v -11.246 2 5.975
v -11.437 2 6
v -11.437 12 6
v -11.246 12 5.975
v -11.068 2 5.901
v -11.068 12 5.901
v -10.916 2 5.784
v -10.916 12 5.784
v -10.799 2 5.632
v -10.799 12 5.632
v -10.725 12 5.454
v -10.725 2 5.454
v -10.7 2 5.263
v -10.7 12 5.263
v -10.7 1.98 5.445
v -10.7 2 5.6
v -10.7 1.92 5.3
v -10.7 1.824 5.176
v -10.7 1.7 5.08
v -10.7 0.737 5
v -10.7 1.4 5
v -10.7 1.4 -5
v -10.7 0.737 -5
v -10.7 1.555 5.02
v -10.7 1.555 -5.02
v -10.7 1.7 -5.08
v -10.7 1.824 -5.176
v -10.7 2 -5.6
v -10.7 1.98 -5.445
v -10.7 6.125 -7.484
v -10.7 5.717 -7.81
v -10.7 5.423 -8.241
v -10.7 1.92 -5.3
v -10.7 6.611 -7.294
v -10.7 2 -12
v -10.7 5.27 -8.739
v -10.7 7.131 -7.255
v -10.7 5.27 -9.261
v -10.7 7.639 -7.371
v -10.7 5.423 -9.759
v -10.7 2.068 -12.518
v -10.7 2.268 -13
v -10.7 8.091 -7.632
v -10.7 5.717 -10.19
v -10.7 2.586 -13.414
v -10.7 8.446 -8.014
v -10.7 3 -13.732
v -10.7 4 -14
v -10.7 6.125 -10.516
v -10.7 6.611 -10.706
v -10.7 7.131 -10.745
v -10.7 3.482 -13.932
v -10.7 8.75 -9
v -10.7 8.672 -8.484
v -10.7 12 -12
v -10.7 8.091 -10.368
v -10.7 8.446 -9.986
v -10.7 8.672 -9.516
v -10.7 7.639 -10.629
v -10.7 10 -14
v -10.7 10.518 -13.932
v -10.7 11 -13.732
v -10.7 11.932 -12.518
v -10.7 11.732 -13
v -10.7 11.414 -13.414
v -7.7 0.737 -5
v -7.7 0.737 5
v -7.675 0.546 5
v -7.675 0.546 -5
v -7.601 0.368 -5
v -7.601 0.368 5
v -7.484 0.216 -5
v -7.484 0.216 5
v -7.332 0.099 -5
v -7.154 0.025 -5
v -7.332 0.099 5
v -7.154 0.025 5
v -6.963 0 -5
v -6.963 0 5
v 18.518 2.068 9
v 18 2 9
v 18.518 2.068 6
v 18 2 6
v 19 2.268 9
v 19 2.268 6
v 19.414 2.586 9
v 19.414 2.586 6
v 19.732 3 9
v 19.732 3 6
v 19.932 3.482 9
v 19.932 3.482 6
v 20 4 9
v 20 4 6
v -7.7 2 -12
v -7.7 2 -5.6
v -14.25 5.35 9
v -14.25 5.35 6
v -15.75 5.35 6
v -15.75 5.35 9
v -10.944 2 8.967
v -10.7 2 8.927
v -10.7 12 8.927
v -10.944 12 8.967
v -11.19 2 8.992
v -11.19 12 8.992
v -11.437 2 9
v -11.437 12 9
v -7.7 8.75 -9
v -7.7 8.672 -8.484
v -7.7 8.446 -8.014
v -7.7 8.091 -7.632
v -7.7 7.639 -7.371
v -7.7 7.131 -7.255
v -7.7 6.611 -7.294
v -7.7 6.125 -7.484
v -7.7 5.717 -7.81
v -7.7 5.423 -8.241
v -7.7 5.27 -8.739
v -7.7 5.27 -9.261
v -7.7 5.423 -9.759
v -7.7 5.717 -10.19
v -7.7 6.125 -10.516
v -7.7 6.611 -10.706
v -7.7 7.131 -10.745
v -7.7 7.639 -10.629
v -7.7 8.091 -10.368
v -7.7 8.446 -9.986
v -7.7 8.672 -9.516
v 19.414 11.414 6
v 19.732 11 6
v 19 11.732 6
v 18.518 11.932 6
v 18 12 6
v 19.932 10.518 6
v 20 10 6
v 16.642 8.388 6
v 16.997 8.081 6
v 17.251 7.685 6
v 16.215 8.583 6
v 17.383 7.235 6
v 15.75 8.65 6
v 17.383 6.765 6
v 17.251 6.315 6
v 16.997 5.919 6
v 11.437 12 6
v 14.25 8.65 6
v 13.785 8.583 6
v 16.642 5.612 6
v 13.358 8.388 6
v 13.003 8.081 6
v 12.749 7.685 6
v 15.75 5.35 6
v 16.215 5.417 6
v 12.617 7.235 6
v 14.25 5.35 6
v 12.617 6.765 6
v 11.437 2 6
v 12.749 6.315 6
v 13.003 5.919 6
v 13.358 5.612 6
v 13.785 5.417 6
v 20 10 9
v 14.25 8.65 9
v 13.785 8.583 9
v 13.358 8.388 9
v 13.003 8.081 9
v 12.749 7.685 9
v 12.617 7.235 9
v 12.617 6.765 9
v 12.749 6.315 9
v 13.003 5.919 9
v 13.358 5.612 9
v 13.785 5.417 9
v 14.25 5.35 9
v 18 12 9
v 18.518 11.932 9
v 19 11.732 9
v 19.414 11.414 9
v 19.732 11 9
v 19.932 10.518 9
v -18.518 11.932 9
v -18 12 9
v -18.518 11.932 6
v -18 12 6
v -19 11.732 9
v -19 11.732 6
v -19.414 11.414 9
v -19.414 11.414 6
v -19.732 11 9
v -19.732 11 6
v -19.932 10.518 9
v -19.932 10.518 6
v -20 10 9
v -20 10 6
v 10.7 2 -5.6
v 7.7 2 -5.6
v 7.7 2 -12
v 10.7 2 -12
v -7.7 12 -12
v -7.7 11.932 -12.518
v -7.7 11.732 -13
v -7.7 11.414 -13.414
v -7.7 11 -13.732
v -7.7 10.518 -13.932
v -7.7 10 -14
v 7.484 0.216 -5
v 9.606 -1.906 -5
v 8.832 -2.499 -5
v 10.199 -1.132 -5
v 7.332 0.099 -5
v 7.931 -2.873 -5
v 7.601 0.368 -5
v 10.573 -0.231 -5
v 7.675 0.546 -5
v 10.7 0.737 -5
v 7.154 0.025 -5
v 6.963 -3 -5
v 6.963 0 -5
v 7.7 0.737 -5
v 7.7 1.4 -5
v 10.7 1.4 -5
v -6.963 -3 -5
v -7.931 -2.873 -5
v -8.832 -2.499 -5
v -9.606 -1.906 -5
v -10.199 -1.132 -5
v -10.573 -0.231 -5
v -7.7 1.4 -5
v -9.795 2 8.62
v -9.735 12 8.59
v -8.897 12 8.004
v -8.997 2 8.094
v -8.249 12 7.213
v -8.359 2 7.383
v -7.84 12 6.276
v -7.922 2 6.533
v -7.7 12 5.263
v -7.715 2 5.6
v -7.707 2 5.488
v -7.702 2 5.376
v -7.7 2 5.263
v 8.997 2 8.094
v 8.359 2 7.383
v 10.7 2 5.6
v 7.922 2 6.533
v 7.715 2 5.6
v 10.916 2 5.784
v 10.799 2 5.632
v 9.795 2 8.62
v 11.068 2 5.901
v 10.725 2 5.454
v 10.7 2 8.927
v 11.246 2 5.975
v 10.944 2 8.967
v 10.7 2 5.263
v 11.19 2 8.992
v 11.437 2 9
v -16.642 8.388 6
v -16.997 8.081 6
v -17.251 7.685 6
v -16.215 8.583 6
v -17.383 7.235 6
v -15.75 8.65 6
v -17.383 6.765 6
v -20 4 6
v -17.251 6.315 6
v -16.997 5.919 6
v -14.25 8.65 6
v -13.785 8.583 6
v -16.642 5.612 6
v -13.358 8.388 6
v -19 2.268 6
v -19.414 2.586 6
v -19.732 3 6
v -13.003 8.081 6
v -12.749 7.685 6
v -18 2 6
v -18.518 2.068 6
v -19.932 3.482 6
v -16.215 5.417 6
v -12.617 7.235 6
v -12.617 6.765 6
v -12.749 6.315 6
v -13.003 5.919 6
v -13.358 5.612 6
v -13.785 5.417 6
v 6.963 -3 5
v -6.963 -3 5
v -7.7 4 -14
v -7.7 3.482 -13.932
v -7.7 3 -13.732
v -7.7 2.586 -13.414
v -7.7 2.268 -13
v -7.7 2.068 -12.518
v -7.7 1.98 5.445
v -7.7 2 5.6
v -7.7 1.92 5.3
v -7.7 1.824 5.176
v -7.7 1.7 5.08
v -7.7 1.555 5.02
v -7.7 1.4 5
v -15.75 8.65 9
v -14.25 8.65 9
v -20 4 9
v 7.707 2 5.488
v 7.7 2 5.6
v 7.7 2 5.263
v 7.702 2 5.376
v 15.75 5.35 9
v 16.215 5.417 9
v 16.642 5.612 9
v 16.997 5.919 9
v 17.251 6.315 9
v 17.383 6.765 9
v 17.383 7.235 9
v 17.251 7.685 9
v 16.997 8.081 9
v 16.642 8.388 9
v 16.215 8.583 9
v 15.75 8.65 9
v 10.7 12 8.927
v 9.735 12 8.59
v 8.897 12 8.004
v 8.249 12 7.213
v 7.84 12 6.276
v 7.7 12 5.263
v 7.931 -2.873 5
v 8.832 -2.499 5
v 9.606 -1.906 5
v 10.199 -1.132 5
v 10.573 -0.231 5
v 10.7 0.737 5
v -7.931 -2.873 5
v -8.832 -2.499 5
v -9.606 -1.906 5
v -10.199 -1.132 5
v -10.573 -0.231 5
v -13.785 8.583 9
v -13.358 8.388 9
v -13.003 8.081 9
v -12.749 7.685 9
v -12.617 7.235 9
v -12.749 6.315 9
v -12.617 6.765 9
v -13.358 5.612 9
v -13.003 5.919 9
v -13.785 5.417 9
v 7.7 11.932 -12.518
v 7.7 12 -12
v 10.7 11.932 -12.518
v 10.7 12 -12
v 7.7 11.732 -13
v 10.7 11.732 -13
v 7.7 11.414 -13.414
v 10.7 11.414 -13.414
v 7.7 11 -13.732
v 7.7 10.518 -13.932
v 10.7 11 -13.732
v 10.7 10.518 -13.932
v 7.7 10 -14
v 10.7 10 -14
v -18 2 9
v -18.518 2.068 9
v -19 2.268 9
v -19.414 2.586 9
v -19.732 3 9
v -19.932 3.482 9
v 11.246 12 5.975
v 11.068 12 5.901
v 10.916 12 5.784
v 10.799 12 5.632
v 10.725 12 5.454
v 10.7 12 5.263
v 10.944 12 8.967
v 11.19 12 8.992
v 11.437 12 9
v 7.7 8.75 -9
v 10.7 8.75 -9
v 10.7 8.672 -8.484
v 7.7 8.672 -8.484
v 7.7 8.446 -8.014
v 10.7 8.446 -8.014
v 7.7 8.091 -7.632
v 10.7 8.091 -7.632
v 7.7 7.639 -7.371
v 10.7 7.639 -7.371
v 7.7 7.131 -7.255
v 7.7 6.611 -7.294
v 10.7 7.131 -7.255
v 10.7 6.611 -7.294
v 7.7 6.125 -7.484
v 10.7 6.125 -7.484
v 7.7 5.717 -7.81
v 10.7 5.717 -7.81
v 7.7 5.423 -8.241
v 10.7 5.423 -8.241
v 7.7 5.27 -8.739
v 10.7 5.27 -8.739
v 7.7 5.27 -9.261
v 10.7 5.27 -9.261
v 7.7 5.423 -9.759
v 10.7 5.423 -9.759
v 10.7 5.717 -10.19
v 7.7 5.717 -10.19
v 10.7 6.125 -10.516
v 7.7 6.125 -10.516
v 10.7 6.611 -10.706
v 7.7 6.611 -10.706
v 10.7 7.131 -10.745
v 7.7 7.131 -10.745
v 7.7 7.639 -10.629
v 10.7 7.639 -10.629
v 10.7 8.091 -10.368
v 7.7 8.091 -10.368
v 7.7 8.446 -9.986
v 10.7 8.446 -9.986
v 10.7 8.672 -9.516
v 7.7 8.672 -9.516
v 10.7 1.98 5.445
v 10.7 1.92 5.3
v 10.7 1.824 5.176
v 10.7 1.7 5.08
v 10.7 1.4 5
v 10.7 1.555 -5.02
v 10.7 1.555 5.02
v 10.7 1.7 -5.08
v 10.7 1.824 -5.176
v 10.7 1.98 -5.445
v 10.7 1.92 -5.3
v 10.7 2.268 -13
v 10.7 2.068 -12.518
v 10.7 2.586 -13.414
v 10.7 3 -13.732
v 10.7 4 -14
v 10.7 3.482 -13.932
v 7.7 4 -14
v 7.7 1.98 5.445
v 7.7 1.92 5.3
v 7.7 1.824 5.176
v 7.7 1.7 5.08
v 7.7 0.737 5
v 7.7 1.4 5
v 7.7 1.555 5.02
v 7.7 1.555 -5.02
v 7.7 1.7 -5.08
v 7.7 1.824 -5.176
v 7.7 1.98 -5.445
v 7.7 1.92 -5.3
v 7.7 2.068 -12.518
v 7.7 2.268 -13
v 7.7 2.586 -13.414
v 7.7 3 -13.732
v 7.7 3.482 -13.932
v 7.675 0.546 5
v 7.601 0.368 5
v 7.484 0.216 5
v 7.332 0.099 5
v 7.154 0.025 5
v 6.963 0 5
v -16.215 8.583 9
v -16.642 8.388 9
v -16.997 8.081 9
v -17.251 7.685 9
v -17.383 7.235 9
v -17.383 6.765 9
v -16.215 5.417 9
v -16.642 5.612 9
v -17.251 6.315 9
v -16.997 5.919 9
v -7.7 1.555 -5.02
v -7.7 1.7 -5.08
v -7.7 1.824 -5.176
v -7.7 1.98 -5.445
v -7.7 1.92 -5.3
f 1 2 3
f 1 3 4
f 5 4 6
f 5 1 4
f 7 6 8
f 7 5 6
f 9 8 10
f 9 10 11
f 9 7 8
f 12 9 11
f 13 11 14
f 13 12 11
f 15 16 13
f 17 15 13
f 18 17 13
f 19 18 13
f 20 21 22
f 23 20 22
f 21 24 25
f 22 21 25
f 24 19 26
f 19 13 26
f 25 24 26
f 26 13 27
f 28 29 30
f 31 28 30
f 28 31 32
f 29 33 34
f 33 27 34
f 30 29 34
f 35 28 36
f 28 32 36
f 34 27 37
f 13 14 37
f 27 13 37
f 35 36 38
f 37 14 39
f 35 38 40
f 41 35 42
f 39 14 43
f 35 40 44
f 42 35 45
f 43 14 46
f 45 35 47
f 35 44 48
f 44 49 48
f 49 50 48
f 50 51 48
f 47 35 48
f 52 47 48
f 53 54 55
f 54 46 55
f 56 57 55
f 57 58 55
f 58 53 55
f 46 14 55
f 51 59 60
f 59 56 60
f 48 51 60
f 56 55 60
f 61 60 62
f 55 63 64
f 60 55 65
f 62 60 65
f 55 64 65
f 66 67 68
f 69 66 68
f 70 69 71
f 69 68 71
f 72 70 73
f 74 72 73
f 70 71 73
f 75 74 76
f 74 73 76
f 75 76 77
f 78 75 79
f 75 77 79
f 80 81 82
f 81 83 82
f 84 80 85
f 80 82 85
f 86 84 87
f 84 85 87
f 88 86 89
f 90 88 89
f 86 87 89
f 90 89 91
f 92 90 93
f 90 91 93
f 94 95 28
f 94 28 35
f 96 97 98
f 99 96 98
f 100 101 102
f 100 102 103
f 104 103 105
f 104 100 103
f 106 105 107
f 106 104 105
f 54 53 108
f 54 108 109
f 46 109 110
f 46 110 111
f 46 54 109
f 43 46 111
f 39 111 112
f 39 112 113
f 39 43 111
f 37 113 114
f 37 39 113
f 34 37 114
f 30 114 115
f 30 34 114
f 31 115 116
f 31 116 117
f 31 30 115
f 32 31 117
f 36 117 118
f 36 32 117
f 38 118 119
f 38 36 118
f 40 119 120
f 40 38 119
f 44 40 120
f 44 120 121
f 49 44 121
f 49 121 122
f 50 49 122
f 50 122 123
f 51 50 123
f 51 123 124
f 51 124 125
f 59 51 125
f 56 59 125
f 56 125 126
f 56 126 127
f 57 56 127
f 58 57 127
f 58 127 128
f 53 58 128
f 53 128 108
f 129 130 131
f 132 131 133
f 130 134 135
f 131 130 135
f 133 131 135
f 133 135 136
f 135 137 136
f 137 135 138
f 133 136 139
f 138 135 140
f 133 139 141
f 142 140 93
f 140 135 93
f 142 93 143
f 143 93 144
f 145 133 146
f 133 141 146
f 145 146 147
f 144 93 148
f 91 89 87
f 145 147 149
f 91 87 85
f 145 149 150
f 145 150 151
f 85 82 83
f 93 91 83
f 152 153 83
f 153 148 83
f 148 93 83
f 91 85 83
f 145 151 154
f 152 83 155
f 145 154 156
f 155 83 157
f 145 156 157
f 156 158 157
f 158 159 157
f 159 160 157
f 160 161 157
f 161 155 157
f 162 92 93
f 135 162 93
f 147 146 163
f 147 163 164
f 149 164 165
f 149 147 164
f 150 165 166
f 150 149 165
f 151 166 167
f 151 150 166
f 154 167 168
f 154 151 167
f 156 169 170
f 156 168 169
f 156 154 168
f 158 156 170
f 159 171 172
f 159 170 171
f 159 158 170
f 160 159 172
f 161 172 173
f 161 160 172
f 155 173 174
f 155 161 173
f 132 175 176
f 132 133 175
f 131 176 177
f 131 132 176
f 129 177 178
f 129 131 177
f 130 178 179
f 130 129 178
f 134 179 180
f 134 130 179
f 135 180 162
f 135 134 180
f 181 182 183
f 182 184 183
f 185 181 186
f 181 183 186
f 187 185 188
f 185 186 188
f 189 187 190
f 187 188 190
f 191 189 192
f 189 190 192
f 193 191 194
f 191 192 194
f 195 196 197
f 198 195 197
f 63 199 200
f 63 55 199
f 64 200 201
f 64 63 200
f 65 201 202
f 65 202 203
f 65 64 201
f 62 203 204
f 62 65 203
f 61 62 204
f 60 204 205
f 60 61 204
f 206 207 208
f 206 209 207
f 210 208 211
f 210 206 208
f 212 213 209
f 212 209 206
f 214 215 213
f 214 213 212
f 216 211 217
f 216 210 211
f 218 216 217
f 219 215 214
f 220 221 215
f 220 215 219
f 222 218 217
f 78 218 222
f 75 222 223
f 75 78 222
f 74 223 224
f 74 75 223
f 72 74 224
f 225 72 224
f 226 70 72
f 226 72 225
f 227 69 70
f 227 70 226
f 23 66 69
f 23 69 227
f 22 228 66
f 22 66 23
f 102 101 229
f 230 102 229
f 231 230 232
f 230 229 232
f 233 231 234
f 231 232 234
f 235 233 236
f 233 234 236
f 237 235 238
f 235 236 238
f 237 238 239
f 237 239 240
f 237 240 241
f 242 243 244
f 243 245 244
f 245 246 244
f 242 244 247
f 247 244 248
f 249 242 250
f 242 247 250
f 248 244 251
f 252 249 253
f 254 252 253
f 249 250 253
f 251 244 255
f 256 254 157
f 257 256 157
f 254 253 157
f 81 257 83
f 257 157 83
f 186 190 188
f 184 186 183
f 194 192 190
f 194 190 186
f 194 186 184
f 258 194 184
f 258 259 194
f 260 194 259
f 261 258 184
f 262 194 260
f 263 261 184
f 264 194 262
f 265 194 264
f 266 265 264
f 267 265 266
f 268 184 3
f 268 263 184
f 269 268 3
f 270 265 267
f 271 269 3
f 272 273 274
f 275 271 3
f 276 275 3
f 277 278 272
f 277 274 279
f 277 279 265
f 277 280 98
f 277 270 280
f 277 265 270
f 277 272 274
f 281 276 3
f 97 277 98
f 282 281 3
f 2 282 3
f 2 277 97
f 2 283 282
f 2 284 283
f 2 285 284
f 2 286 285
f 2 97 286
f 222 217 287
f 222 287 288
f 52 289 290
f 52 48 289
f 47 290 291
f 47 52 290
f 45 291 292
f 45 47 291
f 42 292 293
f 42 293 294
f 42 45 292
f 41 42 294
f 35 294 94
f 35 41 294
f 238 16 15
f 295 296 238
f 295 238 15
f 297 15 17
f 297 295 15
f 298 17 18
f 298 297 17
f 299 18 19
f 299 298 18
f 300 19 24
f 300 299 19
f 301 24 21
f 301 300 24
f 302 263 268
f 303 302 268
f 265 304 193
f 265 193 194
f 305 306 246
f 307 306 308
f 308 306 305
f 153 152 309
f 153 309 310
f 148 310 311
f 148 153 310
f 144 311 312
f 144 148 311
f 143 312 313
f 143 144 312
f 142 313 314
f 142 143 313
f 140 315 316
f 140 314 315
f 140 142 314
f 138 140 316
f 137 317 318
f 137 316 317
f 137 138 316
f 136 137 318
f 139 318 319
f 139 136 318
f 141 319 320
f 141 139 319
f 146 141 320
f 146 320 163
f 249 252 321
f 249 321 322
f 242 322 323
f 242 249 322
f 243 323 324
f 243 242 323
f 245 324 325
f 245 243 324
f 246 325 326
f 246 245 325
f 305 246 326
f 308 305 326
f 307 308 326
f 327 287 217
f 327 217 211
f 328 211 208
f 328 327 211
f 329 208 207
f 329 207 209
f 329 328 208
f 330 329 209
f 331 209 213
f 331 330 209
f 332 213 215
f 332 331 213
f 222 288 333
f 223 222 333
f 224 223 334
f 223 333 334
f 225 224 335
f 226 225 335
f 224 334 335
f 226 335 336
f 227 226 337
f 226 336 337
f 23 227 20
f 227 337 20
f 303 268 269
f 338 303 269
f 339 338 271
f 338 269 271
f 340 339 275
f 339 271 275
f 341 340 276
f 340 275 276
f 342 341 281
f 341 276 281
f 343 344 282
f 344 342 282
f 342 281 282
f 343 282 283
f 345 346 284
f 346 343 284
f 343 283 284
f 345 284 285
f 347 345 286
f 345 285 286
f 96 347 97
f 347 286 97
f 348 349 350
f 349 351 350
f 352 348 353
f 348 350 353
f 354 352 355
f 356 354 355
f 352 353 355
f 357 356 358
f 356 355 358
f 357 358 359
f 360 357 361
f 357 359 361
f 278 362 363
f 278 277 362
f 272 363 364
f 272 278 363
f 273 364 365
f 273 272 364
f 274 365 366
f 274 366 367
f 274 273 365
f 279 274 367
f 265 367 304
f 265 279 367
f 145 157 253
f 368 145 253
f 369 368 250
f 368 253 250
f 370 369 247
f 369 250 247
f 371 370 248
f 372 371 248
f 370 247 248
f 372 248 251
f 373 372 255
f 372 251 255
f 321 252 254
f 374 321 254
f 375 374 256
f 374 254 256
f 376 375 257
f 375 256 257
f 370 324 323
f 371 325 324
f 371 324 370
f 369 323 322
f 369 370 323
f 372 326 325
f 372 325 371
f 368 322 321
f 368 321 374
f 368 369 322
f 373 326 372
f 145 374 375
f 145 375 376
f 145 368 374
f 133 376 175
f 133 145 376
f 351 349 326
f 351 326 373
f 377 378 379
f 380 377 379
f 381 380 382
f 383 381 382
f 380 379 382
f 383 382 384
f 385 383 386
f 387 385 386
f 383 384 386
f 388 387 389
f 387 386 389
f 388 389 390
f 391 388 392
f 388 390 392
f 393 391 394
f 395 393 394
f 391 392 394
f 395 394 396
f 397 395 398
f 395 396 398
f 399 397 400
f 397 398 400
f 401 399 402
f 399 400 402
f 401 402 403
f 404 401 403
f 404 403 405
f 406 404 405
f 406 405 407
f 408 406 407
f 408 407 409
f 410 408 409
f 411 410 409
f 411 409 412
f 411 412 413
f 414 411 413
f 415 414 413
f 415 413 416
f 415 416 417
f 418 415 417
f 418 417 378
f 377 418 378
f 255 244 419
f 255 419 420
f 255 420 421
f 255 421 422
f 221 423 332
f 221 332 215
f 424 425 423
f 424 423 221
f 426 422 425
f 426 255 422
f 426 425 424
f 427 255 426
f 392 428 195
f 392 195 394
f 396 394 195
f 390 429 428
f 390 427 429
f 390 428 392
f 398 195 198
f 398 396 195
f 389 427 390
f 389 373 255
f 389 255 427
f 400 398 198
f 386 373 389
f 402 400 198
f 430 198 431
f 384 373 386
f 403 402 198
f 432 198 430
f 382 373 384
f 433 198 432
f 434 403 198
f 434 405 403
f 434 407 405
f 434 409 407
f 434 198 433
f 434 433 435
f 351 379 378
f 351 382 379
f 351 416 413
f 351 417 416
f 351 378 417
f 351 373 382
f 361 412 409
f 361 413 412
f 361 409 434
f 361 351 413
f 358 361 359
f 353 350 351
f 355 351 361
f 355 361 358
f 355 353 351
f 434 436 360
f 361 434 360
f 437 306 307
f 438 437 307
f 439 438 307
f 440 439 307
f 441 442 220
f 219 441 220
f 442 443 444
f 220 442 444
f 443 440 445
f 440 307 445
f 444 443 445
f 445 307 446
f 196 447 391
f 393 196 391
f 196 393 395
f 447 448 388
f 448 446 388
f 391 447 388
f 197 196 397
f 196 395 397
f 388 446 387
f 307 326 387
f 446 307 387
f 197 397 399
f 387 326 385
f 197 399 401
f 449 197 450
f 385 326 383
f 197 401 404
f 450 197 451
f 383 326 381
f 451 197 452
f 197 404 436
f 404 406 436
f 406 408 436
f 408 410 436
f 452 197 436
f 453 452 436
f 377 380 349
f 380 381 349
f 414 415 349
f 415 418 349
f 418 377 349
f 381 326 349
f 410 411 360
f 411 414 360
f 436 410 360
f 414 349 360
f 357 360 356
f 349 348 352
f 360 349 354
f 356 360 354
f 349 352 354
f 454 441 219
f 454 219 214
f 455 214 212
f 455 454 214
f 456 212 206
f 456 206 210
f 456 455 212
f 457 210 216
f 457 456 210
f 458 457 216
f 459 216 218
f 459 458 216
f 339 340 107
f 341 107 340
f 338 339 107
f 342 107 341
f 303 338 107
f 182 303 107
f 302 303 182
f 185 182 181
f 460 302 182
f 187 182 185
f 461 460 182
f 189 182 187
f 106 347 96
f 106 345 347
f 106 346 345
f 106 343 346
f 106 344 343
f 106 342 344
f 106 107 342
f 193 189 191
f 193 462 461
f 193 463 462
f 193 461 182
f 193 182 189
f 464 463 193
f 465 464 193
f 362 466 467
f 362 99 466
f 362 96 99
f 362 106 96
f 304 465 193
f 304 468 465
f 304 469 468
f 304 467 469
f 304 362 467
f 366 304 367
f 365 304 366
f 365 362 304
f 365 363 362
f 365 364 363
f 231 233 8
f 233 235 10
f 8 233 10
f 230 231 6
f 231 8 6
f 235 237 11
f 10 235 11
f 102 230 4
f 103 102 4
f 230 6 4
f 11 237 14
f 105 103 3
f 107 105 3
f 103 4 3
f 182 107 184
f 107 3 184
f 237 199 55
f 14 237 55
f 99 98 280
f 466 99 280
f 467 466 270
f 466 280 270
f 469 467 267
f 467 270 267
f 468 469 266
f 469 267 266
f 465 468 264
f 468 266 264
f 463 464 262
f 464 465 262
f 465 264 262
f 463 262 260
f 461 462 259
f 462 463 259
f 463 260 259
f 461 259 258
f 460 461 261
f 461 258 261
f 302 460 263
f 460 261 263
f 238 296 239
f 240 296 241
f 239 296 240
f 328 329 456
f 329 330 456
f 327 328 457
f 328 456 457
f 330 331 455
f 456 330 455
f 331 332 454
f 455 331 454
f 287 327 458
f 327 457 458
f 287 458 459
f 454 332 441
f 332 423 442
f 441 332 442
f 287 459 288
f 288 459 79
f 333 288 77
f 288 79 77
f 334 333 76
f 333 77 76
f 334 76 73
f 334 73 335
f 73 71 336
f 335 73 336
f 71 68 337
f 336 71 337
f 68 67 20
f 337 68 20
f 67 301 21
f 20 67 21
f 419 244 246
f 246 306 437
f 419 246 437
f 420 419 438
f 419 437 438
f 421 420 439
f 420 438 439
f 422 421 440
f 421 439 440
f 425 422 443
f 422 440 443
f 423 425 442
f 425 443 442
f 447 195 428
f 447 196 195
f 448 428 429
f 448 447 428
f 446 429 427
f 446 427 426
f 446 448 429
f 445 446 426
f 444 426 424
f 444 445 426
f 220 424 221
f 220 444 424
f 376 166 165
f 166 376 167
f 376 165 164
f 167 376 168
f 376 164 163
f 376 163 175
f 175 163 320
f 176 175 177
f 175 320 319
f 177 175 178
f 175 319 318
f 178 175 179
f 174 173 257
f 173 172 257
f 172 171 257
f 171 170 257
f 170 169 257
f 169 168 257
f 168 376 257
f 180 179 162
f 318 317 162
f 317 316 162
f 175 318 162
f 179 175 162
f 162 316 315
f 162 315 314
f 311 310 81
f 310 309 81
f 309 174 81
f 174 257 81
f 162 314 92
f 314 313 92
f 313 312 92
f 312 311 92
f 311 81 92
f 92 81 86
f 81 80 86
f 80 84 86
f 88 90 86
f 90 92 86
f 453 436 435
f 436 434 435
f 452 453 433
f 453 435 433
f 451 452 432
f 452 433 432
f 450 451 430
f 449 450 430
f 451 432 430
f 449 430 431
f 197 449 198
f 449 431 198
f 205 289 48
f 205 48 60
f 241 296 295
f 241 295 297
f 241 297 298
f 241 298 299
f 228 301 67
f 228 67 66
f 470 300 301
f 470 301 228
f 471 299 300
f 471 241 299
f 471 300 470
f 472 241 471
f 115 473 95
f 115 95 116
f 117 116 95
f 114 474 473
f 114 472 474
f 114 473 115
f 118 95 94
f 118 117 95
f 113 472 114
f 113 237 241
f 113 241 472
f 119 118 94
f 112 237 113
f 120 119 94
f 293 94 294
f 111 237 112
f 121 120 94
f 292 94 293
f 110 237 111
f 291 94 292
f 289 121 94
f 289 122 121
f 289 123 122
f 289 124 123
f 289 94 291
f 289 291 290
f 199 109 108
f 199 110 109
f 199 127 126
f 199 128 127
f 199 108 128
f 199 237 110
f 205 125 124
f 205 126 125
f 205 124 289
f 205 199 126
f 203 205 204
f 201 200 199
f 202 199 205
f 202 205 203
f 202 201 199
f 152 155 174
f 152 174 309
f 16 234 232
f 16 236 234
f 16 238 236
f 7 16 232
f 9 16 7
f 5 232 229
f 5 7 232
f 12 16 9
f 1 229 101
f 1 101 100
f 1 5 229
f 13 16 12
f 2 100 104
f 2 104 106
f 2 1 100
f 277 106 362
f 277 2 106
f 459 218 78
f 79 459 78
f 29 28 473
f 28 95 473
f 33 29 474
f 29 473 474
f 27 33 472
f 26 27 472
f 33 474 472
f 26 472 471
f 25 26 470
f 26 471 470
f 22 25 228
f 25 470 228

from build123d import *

# Parameters (mm, degrees)
SKETCH1_W                    = 7.7
SKETCH1_H                    = 10
BASE_FLANGE1_DEPTH           = 3
EDGE_FLANGE1_STRIP_W         = 13.4732
EDGE_FLANGE1_STRIP_H         = 3
EDGE_FLANGE1_STRIP_CUT_DEPTH = 10
EDGE_FLANGE1_DEPTH           = 10
TAB1_START                   = -3
TAB1_OUTLINE_W               = 23
TAB1_OUTLINE_H               = 10
TAB1_DEPTH                   = 3
FILLET1_R                    = 0.6
FILLET2_R                    = 2
SKETCH15_R                   = 1.75
CUT_EXTRUDE1_DEPTH           = 22.318771072
EDGE_FLANGE2_START           = 2
EDGE_FLANGE2_DEPTH           = 10
EDGE_FLANGE2_2_DEPTH         = 10
CUT_EXTRUDE2_DEPTH           = 31.724582991
FILLET3_R                    = 2


# Read off the part's stored shape, not the designer's step: Tab1, Edge-Flange2
# Sheet-metal steps are written as plain solids
with BuildPart() as part:
    # Sketch1 → Base-Flange1 (new body)
    with BuildSketch(Plane(origin=(0, 0, 0), x_dir=(1, 0, 0), z_dir=(0, 1, 0))):
        with Locations((3.85, 0)):
            Rectangle(SKETCH1_W, SKETCH1_H)
    extrude(amount=-BASE_FLANGE1_DEPTH)

    # Edge-Flange1 strip (across the edge) → Edge-Flange1 strip cut (cut)
    with BuildSketch(Plane(origin=(7.7, 0, 5), x_dir=(-1, 0, 0), z_dir=(0, 0, -1))):
        with Locations((-6, -1.5)):
            Rectangle(EDGE_FLANGE1_STRIP_W, EDGE_FLANGE1_STRIP_H)
    extrude(amount=EDGE_FLANGE1_STRIP_CUT_DEPTH, mode=Mode.SUBTRACT)

    # Edge-Flange1 section (across the edge) → Edge-Flange1 (add)
    with BuildSketch(Plane(origin=(7.7, 0, 5), x_dir=(-1, 0, 0), z_dir=(0, 0, -1))):
        with BuildLine():
            Line((-3, 0.7366), (-3, 2))
            Line((-3, 2), (0, 2))
            Line((0, 2), (0, 0.7366))
            ThreePointArc((0, 0.7366), (0.215745145, 0.215745145), (0.7366, 0))
            Line((0.7366, 0), (0.7366, -3))
            ThreePointArc((0.7366, -3), (-1.905575199, -1.905575199), (-3, 0.7366))
        make_face()
    extrude(amount=EDGE_FLANGE1_DEPTH)

    # Tab1 outline → Tab1 (add)
    with BuildSketch(Plane(origin=(10.7, 0, 0), x_dir=(0, 0, -1), z_dir=(1, 0, 0)).offset(TAB1_START)):
        with Locations((2.5, 7)):
            Rectangle(TAB1_OUTLINE_W, TAB1_OUTLINE_H)
    extrude(amount=TAB1_DEPTH)

    # Fillet1
    fillet1_edges = [part.edges().sort_by_distance(p)[0] for p in [
        (9.2, 2, 5),
        (9.2, 2, -5),
    ]]
    fillet(fillet1_edges, radius=FILLET1_R)

    # Fillet2
    fillet2_edges = [part.edges().sort_by_distance(p)[0] for p in [
        (9.2, 12, -14),
        (9.2, 2, -14),
    ]]
    fillet(fillet2_edges, radius=FILLET2_R)

    # Sketch15 → Cut-Extrude1 (cut, through all)
    with BuildSketch(Plane(origin=(10.7, 0, 0), x_dir=(0, 0, -1), z_dir=(1, 0, 0))):
        with Locations(Location((9, 7, 0), (0, 0, 90))):
            Circle(SKETCH15_R)
    extrude(amount=-CUT_EXTRUDE1_DEPTH, mode=Mode.SUBTRACT)

    # Edge-Flange2 outline → Edge-Flange2 (cut)
    with BuildSketch(Plane(origin=(0, 0, 0), x_dir=(1, 0, 0), z_dir=(0, 1, 0)).offset(EDGE_FLANGE2_START)):
        with BuildLine():
            Line((10.7, -9), (10.7, -8.926677222))
            ThreePointArc((10.7, -8.926677222), (8.545704021, -7.630867001), (7.7, -5.2634))
            Line((7.7, -5.2634), (7.7, -9))
            Line((7.7, -9), (10.7, -9))
        make_face()
    extrude(amount=EDGE_FLANGE2_DEPTH, mode=Mode.SUBTRACT)

    # Edge-Flange2 2 outline → Edge-Flange2 2 (add)
    with BuildSketch(Plane(origin=(0, 0, 0), x_dir=(1, 0, 0), z_dir=(0, 1, 0)).offset(EDGE_FLANGE2_START)):
        with BuildLine():
            ThreePointArc((10.7, -8.926677222), (11.06647982, -8.981624121), (11.4366, -9))
            Line((11.4366, -9), (20, -9))
            Line((20, -9), (20, -6))
            Line((20, -6), (11.4366, -6))
            ThreePointArc((11.4366, -6), (10.915745145, -5.784254855), (10.7, -5.2634))
            Line((10.7, -5.2634), (10.7, -8.926677222))
        make_face()
    extrude(amount=EDGE_FLANGE2_2_DEPTH)

    # Sketch23 → Cut-Extrude2 (cut, through all)
    with BuildSketch(Plane(origin=(0, 0, 6), x_dir=(-1, 0, 0), z_dir=(0, 0, -1))):
        with BuildLine():
            Line((-15.75, 8.65), (-14.25, 8.65))
            ThreePointArc((-14.25, 8.65), (-12.6, 7), (-14.25, 5.35))
            Line((-14.25, 5.35), (-15.75, 5.35))
            ThreePointArc((-15.75, 5.35), (-17.4, 7), (-15.75, 8.65))
        make_face()
    extrude(amount=-CUT_EXTRUDE2_DEPTH, mode=Mode.SUBTRACT)

    # Fillet3
    fillet3_edges = [part.edges().sort_by_distance(p)[0] for p in [
        (20, 12, 7.5),
        (20, 2, 7.5),
    ]]
    fillet(fillet3_edges, radius=FILLET3_R)

    # Mirror1: part across plane


with BuildPart() as part_1:
    add(part.part)
    add(part.part.mirror(Plane(origin=(0, -3, -5), x_dir=(0, 0, 1), z_dir=(-1, 0, 0))))


solid = part_1.part
